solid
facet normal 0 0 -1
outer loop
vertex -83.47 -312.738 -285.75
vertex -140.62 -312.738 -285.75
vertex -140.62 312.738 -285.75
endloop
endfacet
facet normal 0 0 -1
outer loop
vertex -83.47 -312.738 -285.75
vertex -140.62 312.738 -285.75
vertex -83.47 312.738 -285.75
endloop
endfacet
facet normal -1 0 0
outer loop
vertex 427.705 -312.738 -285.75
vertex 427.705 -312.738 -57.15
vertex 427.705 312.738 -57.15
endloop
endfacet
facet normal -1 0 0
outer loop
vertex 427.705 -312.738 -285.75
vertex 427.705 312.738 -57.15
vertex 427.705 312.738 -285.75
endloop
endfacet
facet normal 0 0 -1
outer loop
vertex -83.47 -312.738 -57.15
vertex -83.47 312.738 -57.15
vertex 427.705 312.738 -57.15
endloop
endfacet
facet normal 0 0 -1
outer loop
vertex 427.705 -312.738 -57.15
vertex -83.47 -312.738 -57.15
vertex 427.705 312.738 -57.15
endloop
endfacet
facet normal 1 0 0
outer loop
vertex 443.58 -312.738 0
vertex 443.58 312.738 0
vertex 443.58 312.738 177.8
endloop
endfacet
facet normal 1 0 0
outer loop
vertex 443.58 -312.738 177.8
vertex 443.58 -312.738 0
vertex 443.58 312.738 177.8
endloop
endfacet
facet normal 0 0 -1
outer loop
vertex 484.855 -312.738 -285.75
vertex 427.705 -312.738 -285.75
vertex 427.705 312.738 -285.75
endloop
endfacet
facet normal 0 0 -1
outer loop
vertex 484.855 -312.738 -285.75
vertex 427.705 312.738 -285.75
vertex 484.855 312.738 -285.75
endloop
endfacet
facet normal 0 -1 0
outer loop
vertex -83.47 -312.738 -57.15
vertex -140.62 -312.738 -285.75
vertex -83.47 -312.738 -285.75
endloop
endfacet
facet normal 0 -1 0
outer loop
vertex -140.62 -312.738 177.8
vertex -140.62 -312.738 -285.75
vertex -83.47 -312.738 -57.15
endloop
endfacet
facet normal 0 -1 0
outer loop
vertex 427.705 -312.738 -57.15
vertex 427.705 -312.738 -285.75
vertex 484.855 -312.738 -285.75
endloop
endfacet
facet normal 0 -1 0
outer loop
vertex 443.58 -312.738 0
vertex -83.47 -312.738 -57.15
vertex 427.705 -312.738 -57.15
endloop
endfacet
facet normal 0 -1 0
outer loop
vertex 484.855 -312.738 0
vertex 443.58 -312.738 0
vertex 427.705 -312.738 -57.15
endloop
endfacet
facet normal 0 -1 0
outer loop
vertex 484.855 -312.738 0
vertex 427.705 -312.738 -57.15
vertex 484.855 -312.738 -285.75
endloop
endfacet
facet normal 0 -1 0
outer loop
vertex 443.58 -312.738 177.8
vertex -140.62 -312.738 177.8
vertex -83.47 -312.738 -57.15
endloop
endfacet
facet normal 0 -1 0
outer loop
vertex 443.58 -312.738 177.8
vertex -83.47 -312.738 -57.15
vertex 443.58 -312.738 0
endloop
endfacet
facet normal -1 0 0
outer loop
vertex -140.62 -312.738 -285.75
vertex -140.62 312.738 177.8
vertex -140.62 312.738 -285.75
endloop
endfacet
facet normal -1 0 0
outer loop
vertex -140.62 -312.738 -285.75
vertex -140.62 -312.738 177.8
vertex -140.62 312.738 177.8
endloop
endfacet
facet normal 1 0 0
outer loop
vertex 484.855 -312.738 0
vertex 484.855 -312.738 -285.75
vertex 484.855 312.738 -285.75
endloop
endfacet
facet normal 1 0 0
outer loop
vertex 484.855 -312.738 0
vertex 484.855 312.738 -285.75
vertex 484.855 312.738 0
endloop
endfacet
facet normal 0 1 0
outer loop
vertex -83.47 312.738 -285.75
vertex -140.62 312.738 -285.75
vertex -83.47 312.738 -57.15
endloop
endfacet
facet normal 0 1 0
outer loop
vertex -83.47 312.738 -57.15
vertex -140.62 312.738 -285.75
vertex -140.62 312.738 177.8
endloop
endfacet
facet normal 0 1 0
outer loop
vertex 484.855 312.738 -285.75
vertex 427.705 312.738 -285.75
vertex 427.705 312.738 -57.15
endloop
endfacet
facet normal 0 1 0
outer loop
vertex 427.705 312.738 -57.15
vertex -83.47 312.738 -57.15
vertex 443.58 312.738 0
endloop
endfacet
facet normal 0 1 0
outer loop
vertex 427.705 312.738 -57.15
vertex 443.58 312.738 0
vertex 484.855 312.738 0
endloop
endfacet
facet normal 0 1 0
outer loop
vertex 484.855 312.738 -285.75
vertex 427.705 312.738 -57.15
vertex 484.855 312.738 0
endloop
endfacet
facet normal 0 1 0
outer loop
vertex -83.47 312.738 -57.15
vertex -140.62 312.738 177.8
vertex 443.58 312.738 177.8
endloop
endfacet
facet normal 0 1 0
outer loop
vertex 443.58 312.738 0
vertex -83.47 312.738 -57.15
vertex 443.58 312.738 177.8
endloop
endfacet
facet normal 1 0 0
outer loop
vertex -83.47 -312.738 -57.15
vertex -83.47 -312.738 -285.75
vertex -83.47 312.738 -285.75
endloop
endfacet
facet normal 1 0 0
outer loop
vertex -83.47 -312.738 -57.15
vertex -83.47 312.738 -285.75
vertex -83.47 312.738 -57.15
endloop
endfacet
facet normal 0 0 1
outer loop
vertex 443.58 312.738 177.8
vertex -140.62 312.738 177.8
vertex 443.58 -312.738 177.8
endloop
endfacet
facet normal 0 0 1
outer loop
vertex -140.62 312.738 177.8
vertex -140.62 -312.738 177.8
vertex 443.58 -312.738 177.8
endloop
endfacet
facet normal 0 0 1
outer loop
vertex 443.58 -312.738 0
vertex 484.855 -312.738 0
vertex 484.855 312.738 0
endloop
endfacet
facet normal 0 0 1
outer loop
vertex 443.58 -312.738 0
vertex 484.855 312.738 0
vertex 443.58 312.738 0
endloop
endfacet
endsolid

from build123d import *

# Parameters (mm, degrees)
F0_W     = 584.2
F0_H     = 177.8
F1_DEPTH = 312.7375


with BuildPart() as f1:
    # F0 (on Front) → F1 (new body, symmetric)
    with BuildSketch(Plane.XZ):
        with Locations((151.479768, 88.9)):
            Rectangle(F0_W, F0_H)
        Polygon((443.579768, 0), (-140.620232, 0), (-140.620232, -285.75), (-83.470232, -285.75), (-83.470232, -57.15), (427.704768, -57.15), (427.704768, -285.75), (484.854768, -285.75), (484.854768, 0), align=None)
    extrude(amount=F1_DEPTH, both=True)


solid = f1.part
